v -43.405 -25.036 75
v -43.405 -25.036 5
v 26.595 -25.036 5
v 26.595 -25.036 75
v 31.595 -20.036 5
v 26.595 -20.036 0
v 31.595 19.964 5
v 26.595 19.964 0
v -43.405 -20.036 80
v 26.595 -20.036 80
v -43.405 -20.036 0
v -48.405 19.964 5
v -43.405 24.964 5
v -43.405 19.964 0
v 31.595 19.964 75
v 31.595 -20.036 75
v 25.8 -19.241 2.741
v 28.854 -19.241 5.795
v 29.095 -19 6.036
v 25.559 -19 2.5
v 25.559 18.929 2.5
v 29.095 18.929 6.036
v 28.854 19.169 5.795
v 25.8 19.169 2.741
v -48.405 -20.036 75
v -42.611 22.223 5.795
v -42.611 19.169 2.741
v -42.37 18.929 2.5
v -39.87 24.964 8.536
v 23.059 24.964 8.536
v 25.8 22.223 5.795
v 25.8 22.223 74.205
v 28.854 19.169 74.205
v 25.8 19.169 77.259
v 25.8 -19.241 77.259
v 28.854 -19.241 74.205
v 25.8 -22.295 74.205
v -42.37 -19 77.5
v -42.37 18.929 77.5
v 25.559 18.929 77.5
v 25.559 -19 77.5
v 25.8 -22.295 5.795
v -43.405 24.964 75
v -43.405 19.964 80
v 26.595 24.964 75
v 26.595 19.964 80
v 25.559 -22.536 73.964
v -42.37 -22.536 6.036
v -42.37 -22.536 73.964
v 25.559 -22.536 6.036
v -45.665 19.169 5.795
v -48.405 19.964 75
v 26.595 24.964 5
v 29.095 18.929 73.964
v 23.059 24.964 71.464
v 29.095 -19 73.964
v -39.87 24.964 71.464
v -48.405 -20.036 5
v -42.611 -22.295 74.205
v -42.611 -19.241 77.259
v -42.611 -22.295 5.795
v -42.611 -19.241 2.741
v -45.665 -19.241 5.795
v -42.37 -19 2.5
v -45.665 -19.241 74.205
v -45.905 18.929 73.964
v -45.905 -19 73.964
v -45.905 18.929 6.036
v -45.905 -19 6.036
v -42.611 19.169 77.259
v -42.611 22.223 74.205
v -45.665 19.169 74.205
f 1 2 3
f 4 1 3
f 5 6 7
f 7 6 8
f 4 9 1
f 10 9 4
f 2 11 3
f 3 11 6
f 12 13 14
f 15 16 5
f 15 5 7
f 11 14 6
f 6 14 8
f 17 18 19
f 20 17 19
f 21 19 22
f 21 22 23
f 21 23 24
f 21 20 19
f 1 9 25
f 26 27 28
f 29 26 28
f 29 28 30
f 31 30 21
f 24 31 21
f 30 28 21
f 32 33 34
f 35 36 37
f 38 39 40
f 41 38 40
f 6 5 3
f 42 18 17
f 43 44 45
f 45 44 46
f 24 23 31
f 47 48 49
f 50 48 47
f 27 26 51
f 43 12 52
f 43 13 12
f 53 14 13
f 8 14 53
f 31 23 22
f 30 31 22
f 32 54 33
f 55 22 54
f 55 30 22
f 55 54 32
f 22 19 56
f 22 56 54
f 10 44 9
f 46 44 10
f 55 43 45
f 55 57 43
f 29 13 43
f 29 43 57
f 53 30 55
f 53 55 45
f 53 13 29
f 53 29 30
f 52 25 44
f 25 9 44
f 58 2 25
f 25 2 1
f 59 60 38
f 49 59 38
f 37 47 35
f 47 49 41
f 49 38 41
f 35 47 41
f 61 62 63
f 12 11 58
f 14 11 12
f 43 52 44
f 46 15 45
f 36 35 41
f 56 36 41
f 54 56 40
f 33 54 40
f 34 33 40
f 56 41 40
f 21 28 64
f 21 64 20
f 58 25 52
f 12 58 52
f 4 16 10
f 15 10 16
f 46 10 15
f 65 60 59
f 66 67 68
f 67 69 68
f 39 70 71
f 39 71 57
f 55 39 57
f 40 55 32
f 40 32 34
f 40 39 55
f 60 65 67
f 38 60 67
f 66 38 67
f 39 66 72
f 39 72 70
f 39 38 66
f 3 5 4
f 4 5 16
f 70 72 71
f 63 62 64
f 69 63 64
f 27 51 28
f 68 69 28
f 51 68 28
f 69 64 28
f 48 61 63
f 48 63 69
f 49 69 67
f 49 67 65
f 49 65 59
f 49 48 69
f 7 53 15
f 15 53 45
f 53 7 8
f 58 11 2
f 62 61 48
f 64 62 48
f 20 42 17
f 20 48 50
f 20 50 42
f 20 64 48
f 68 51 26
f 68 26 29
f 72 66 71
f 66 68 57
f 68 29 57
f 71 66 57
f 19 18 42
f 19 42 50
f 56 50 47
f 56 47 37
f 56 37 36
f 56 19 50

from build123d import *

# Parameters (mm, degrees)
F0_W     = 80
F0_H     = 50
F1_DEPTH = 80
F2_SIZE  = 5
F3_T     = -2.5


with BuildPart() as f1:
    # F0 (on Top) → F1 (new body)
    with BuildSketch(Plane.XY):
        with Locations((-8.405441, -0.035937)):
            Rectangle(F0_W, F0_H)
    extrude(amount=F1_DEPTH)

    # F2
    f2_edges = [f1.edges().sort_by_distance(p)[0] for p in [
        (31.594559, -0.035937, 80),
        (31.594559, -25.035937, 40),
        (31.594559, -0.035937, 0),
        (31.594559, 24.964063, 40),
        (-48.405441, -0.035937, 80),
        (-48.405441, 24.964063, 40),
        (-8.405441, 24.964063, 0),
        (-8.405441, 24.964063, 80),
        (-8.405441, -25.035937, 80),
        (-48.405441, -0.035937, 0),
        (-8.405441, -25.035937, 0),
        (-48.405441, -25.035937, 40),
    ]]
    chamfer(f2_edges, length=F2_SIZE)

    # F3
    f3_openings = [f1.faces().sort_by_distance(p)[0] for p in [
        (-8.405441, 24.964063, 40),
    ]]
    offset(amount=F3_T, openings=f3_openings)


solid = f1.part
